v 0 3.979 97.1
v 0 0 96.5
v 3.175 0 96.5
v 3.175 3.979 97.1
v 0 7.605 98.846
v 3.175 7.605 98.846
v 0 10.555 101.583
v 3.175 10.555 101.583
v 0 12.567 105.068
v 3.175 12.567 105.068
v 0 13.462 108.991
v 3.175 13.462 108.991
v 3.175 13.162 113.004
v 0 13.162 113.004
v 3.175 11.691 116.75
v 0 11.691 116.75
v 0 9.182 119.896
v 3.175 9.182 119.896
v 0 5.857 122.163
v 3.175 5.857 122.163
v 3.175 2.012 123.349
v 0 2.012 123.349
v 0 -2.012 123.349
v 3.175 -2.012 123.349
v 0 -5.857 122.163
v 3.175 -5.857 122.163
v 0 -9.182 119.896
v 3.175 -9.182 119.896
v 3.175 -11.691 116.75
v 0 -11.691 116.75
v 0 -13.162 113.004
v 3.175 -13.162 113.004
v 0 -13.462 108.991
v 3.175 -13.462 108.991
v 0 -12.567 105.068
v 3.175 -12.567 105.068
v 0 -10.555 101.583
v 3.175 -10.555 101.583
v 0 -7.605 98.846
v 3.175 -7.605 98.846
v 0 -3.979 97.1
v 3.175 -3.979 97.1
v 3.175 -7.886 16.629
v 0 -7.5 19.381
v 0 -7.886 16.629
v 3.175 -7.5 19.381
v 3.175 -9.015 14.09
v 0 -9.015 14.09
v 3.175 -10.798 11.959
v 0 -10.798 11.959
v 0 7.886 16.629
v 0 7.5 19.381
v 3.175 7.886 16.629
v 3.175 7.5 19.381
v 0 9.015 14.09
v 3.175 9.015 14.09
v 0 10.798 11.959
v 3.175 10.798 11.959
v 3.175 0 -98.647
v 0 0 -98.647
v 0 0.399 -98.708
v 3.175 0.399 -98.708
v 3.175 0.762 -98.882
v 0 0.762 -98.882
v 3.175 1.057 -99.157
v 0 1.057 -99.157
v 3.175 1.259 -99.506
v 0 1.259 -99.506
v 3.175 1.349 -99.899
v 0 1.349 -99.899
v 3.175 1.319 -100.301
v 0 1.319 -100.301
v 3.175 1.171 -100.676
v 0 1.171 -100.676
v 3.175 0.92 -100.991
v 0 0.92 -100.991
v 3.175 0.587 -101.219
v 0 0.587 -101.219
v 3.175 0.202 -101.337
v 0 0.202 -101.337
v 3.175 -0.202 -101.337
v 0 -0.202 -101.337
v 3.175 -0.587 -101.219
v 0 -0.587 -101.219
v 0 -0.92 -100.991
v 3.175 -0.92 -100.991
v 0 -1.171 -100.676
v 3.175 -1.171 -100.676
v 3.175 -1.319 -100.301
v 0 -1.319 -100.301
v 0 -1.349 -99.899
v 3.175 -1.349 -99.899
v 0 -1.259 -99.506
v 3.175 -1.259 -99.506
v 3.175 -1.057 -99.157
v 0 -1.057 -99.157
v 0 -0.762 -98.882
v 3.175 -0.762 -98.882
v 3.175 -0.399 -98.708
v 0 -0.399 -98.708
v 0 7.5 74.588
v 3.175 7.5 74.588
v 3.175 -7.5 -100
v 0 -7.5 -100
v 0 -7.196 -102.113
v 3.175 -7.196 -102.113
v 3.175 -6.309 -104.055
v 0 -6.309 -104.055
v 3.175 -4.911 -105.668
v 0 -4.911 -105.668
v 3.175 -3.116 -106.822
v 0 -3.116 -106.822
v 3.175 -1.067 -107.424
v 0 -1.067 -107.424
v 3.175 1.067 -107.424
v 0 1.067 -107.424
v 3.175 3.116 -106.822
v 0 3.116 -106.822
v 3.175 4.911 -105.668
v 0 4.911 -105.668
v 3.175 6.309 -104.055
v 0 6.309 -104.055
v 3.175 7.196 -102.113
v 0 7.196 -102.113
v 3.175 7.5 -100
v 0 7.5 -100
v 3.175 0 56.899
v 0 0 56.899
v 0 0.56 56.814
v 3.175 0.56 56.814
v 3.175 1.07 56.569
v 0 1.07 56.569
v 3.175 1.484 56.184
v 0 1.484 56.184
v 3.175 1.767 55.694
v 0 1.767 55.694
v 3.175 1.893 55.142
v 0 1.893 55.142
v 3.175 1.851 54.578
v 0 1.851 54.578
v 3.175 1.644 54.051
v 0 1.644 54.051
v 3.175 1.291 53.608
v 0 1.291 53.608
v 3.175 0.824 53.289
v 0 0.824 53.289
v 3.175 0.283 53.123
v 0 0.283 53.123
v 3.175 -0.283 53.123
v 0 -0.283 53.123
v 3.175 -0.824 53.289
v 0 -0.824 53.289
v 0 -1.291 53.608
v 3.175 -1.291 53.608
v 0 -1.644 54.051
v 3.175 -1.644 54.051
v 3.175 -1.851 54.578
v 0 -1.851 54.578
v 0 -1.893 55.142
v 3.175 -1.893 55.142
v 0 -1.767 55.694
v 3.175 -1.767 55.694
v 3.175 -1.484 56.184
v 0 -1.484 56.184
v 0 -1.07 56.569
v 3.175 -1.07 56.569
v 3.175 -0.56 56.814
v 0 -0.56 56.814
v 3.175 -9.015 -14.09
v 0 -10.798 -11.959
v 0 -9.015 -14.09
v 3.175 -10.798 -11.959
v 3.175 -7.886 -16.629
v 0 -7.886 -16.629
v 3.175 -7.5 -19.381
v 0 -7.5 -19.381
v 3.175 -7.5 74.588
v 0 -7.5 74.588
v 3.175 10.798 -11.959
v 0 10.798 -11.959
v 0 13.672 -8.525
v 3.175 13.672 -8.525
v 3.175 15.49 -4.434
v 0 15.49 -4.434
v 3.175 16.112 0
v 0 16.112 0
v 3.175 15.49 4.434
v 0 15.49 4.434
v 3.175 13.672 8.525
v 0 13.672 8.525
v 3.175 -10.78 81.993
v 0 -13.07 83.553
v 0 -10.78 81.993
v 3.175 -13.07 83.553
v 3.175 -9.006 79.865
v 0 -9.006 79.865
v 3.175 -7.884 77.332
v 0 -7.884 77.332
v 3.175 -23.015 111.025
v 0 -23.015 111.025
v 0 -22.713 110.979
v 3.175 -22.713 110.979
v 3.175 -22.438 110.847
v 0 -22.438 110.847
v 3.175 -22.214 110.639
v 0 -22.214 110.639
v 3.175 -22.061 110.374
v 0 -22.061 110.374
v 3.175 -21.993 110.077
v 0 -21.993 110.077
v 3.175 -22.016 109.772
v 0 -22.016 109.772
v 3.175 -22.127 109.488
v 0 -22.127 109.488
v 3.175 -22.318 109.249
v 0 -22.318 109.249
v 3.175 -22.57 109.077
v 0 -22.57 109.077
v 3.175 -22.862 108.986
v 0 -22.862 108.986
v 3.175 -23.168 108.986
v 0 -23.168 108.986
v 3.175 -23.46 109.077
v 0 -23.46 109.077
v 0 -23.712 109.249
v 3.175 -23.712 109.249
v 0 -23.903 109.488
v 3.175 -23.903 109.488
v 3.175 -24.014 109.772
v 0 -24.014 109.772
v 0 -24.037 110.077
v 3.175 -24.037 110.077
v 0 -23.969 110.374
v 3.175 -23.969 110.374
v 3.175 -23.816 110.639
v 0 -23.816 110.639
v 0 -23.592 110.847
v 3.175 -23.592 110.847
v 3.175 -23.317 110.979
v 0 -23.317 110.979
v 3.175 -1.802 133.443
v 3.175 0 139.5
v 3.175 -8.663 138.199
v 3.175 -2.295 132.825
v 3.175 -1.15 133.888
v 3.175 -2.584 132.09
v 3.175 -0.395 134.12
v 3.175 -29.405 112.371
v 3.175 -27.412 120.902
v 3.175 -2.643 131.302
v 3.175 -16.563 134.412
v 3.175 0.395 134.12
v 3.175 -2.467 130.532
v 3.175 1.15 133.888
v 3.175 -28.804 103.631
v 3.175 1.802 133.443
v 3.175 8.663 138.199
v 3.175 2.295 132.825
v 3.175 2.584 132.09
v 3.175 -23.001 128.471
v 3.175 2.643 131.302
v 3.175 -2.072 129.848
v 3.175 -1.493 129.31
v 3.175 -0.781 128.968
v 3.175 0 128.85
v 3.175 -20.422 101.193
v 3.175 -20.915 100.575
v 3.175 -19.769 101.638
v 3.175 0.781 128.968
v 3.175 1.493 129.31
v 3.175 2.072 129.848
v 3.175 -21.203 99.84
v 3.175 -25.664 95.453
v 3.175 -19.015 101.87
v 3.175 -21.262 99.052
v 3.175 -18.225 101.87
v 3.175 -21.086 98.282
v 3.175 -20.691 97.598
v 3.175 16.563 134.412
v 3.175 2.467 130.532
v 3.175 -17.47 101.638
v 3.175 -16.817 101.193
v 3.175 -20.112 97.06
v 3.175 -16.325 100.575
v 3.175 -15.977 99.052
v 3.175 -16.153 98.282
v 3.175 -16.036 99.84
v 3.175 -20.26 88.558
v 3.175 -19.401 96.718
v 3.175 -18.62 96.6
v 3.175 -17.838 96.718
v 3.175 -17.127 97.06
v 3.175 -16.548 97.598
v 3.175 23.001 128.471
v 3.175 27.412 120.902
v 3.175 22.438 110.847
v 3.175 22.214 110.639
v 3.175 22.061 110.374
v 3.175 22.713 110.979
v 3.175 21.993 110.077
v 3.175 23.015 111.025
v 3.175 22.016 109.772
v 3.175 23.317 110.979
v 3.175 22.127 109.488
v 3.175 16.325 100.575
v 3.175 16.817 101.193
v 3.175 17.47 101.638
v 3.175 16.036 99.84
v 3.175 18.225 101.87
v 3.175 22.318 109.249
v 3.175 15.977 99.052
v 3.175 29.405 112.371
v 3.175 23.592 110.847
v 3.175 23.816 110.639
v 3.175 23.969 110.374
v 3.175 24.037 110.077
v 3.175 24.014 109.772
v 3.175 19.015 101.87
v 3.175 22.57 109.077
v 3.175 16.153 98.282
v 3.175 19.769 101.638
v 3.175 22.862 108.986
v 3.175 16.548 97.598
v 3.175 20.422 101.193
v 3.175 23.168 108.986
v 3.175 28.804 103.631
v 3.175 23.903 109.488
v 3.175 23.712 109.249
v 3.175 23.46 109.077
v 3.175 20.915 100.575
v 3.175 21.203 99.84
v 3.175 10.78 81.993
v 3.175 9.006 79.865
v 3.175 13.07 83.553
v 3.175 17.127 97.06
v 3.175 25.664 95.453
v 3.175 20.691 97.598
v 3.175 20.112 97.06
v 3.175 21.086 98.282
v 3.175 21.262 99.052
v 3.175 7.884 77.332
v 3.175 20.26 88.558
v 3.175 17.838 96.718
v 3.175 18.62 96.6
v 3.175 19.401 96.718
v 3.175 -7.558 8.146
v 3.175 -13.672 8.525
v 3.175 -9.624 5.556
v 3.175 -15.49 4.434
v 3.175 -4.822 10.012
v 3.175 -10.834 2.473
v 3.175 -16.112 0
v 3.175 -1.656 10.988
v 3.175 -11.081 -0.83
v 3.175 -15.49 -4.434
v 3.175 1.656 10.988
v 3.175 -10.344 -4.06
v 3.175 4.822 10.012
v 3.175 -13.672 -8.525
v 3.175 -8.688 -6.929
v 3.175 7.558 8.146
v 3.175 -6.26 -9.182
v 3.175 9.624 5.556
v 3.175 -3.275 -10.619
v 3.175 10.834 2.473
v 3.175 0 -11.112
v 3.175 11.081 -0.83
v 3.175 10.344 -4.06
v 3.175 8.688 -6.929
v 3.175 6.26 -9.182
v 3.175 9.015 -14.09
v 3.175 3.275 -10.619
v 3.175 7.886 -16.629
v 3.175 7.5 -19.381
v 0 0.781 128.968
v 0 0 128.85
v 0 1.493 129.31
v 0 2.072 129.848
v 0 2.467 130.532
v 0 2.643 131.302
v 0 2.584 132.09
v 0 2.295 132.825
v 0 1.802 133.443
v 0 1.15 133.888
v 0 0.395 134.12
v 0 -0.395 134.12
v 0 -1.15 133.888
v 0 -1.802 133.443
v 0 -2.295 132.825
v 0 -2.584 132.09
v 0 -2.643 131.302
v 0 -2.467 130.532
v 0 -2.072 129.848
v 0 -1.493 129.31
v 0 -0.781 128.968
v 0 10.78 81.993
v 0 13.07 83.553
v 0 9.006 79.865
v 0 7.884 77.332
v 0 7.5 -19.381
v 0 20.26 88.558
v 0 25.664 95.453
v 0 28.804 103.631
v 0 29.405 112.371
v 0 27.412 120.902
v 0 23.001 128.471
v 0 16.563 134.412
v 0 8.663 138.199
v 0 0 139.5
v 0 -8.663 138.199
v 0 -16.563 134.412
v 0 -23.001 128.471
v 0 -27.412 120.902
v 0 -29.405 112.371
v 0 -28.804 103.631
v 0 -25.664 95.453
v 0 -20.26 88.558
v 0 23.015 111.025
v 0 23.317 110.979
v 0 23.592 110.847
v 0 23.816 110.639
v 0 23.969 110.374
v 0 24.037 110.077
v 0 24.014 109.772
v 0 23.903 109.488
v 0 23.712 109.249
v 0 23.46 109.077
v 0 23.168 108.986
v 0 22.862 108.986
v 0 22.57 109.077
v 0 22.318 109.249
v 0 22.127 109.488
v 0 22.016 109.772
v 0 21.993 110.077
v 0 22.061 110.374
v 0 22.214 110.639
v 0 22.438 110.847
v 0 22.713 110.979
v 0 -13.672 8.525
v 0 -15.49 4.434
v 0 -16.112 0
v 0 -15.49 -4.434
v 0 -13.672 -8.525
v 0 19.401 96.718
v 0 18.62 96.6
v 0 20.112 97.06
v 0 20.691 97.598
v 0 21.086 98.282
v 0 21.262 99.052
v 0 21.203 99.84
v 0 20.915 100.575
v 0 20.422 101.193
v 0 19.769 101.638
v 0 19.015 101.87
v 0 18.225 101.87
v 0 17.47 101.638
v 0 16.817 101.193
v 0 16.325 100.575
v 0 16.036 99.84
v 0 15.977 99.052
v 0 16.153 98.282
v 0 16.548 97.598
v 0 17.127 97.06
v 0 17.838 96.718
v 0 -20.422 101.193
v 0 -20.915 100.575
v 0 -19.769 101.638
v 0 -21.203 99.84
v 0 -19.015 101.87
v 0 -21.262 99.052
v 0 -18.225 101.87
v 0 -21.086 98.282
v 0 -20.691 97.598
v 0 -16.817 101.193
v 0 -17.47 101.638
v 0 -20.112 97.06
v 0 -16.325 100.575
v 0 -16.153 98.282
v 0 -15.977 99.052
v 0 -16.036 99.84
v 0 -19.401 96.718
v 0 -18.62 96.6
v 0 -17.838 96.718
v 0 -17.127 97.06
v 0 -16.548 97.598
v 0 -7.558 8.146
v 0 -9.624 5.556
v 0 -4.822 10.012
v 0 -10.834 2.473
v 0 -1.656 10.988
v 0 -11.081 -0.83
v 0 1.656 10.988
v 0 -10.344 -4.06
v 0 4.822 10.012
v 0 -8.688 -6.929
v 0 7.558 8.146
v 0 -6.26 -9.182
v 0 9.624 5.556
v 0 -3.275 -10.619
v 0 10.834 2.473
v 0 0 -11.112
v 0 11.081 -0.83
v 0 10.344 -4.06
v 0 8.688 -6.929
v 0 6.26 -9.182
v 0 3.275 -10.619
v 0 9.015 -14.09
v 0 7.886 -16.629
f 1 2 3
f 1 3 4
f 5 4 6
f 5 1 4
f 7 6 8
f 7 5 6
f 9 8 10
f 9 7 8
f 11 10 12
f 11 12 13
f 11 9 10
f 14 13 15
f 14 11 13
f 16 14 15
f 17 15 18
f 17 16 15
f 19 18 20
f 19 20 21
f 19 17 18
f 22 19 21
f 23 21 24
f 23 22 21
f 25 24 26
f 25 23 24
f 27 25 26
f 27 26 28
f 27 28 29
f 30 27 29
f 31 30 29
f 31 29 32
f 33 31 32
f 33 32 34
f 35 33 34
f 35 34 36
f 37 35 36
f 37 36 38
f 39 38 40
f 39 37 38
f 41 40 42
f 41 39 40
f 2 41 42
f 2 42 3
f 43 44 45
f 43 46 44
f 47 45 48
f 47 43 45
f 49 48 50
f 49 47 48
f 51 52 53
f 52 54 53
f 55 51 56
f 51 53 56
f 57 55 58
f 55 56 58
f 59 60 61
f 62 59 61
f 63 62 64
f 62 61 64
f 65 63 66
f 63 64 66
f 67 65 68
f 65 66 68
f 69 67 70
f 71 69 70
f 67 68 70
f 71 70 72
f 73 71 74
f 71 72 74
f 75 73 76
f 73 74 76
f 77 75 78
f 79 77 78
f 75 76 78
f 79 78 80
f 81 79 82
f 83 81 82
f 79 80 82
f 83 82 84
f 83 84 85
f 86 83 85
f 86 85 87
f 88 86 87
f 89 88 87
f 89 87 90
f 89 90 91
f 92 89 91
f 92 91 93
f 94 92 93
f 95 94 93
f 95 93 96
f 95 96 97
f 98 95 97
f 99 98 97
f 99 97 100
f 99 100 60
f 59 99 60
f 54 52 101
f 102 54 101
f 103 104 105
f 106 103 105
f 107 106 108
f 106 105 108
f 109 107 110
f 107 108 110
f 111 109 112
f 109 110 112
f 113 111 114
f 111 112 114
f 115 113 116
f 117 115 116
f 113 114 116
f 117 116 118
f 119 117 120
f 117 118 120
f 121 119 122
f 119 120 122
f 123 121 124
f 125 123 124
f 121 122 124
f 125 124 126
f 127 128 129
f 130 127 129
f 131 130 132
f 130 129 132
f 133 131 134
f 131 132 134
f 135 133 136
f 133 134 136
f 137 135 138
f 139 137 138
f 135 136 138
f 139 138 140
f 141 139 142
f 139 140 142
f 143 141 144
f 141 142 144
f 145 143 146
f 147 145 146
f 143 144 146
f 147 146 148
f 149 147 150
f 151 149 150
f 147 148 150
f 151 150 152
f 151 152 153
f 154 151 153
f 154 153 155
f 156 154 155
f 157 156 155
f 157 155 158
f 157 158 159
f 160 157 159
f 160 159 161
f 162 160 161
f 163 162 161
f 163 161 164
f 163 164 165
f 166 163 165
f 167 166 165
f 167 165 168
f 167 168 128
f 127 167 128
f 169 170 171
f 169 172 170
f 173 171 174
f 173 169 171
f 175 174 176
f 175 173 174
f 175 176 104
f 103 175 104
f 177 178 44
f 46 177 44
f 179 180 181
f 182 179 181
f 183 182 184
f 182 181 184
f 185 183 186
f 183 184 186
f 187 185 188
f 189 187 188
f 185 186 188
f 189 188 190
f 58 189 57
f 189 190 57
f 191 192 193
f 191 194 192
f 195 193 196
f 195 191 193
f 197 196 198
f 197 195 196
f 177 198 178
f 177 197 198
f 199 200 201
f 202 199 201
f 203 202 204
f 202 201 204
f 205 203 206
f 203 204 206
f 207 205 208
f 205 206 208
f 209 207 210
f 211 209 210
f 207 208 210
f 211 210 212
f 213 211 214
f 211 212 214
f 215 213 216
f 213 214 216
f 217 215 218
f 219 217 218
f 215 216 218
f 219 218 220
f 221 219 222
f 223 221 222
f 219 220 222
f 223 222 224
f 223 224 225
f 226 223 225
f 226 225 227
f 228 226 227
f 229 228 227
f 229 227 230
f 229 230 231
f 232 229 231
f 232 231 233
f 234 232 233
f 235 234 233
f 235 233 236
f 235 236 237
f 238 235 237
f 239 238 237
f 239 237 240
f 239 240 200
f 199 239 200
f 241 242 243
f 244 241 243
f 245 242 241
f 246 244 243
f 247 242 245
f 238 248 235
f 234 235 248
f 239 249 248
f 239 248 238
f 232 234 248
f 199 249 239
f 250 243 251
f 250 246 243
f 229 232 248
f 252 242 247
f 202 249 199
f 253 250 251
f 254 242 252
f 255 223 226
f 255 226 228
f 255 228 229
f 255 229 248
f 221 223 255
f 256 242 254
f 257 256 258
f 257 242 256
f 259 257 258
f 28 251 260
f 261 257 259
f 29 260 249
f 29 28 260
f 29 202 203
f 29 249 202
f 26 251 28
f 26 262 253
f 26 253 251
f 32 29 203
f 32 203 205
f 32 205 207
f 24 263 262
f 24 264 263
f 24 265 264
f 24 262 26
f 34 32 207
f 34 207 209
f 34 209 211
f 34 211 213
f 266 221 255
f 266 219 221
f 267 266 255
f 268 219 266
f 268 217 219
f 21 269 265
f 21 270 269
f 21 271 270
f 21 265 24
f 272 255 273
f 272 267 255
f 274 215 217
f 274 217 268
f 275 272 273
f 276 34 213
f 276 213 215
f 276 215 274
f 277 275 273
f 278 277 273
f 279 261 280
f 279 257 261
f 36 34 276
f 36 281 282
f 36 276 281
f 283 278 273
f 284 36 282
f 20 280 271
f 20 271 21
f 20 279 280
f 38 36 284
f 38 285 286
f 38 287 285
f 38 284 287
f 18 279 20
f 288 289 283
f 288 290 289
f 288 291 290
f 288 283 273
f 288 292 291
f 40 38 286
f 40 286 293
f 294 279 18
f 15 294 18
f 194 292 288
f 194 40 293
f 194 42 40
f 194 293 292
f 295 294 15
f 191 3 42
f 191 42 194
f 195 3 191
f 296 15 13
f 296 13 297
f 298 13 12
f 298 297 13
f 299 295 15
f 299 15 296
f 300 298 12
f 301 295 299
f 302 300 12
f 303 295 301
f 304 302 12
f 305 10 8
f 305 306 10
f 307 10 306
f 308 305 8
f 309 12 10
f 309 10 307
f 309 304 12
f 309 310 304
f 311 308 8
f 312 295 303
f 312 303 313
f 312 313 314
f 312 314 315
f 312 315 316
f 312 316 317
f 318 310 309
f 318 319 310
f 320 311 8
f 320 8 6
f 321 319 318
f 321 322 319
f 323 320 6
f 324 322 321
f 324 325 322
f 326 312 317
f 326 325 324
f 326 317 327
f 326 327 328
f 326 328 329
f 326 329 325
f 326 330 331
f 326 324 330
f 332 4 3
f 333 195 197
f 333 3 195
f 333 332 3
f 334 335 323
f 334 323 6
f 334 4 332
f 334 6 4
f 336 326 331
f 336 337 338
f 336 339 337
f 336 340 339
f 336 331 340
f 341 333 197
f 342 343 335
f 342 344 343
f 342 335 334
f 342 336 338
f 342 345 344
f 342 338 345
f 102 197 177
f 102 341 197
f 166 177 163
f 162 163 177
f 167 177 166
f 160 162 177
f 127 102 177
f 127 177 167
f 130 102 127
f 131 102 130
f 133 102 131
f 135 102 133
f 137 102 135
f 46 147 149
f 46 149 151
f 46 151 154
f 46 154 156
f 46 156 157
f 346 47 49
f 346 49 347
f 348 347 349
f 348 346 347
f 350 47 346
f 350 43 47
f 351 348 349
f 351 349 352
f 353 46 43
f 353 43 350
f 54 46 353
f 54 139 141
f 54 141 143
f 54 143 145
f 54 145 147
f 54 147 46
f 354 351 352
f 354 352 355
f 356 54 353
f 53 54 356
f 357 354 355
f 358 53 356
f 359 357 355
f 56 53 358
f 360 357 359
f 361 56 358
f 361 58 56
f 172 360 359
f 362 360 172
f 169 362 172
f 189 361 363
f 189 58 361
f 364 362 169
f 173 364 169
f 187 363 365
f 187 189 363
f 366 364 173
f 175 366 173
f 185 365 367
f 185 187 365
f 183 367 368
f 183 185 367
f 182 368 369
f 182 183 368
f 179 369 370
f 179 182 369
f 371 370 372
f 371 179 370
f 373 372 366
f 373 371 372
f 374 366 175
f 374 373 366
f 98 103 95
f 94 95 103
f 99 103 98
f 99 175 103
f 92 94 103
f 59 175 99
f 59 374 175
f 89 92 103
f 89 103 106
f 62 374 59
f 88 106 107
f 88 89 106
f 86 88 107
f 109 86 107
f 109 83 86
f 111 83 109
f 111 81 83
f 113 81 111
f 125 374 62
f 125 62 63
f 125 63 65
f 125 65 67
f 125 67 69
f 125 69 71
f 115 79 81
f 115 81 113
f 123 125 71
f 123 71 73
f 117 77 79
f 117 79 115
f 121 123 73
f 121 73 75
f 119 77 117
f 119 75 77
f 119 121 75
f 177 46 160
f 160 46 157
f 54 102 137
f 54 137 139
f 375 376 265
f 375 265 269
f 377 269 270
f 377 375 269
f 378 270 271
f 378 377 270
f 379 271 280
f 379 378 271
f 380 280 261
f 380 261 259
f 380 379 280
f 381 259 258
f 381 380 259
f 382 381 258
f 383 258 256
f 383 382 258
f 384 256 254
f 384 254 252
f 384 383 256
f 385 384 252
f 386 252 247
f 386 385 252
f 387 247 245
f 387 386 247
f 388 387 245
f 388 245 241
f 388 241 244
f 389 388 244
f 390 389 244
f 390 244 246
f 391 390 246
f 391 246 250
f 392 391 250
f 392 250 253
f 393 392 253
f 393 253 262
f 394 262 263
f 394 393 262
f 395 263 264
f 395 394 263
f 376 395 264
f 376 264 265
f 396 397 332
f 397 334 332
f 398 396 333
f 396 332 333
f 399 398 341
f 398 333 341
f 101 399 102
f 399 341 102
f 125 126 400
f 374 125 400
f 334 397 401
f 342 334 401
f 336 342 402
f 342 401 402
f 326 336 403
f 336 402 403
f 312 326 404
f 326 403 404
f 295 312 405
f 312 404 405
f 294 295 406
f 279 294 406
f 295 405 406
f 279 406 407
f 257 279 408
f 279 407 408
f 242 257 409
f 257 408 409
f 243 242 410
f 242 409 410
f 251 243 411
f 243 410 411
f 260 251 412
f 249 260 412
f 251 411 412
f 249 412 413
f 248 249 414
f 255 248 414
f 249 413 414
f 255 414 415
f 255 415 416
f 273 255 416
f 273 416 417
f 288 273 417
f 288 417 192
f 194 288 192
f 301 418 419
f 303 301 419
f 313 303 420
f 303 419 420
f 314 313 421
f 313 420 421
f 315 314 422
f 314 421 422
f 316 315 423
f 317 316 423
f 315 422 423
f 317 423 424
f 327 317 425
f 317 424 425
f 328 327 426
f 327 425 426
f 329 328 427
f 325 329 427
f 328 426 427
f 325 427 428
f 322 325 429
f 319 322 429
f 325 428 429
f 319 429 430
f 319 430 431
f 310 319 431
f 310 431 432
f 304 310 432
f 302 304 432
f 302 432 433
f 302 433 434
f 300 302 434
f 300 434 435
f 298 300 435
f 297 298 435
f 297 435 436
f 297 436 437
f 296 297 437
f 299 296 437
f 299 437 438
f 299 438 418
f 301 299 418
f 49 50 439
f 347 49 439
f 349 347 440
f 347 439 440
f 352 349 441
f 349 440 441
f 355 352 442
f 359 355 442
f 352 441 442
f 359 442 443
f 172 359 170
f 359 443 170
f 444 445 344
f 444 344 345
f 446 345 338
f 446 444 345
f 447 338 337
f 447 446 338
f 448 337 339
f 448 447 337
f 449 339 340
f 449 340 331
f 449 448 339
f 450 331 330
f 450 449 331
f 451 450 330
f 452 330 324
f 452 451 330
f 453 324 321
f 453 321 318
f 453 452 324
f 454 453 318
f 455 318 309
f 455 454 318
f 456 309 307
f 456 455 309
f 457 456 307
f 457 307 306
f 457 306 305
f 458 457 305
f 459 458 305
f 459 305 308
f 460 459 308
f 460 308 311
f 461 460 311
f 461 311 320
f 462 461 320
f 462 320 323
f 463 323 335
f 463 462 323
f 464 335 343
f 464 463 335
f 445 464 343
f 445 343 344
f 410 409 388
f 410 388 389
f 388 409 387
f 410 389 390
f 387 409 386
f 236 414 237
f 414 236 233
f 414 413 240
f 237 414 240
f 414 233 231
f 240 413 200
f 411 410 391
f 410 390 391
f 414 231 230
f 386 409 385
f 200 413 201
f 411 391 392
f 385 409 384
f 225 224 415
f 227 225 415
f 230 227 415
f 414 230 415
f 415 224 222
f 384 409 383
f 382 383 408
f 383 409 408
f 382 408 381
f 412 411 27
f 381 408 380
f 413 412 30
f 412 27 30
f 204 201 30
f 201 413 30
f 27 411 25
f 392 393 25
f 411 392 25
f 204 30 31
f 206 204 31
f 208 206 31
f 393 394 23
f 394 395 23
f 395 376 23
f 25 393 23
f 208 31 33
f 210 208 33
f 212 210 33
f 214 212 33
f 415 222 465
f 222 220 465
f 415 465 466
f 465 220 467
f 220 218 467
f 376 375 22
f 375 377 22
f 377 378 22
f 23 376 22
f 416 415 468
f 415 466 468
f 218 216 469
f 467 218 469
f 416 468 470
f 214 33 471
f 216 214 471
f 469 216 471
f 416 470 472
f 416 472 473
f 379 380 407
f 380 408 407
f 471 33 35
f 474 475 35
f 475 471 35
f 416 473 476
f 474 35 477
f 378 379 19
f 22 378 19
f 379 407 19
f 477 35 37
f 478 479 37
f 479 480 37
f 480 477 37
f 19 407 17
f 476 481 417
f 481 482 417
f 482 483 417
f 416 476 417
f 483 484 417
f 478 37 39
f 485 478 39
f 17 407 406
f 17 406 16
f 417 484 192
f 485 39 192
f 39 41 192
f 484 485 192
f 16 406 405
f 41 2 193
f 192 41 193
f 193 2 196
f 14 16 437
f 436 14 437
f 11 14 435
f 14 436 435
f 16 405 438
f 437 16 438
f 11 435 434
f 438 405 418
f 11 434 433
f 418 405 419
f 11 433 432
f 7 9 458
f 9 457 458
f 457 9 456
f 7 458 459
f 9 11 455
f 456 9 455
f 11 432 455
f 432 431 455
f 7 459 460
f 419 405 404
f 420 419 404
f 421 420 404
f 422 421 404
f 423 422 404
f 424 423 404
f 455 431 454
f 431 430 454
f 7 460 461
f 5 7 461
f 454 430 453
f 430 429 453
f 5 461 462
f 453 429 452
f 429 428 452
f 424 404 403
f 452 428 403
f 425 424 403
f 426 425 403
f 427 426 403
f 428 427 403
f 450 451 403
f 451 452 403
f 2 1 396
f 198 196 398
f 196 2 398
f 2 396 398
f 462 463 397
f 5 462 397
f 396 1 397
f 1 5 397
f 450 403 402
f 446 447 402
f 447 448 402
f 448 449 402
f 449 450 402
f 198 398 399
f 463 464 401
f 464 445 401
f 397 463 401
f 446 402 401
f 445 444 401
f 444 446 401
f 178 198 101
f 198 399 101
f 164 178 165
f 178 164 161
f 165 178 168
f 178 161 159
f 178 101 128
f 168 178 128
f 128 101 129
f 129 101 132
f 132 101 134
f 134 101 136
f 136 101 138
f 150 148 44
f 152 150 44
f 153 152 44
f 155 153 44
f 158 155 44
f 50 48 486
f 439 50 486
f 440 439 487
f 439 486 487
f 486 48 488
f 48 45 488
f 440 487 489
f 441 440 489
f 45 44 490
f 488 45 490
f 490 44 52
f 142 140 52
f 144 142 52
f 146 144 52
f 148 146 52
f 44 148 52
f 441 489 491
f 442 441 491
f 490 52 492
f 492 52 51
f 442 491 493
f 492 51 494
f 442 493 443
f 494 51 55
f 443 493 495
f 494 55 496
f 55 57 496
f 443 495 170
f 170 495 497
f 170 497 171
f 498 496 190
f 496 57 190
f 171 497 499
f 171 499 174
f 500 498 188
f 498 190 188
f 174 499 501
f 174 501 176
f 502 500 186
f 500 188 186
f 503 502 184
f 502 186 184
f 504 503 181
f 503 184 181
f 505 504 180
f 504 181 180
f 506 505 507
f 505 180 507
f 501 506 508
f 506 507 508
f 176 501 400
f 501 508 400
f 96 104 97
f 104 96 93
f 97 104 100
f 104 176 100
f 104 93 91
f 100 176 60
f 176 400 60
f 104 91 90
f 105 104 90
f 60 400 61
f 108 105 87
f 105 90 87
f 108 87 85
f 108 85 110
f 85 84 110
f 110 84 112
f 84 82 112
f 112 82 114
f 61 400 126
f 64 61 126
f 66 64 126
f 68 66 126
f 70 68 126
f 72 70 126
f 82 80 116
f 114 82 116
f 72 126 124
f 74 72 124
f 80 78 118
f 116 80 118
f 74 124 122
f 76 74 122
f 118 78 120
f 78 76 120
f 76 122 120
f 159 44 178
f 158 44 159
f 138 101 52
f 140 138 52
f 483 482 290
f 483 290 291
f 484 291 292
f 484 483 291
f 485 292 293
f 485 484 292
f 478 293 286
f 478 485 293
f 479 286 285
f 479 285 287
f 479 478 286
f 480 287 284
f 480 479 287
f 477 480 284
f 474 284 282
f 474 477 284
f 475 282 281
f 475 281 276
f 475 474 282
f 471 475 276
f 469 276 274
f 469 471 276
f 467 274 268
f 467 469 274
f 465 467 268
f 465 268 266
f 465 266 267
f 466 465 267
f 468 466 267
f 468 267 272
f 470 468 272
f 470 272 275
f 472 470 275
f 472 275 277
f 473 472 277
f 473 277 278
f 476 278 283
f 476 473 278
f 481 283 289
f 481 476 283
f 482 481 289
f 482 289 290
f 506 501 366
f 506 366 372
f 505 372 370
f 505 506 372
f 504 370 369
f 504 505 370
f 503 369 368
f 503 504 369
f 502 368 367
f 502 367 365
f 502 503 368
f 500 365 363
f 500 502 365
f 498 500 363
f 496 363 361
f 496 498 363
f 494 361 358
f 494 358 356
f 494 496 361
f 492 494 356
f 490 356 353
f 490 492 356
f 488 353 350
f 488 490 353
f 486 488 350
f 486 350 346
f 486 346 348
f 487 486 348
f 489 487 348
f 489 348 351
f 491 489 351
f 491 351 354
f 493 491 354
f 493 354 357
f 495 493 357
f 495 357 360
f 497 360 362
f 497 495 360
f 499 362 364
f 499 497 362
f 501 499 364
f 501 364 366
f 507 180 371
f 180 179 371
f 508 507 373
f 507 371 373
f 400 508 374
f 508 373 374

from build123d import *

# Parameters (mm, degrees)
SKETCH1_R                = 13.5
SKETCH1_R_2              = 2.65
SKETCH1_R_3              = 11.1125
BOSS_EXTRUDE1_DEPTH      = 3.175
M2_5X0_45_TAPPED_HOLE1_D = 2.05
F_6_CLEARANCE_HOLE1_D    = 3.7973
F_6_32_TAPPED_HOLE1_D    = 2.7051
FILLET1_R                = 10


with BuildPart() as part:
    # Sketch1 → Boss-Extrude1 (new body)
    with BuildSketch(Plane(origin=(0, 0, 0), x_dir=(0, 0, -1), z_dir=(1, 0, 0))):
        with BuildLine():
            ThreePointArc((-81.469314765, 7.5), (-139.5, 0), (-81.469314765, -7.5))
            Line((-81.469314765, -7.5), (-14.260527909, -7.5))
            ThreePointArc((-14.260527909, -7.5), (0, -16.1125), (14.260527909, -7.5))
            Line((14.260527909, -7.5), (100, -7.5))
            ThreePointArc((100, -7.5), (107.5, 0), (100, 7.5))
            Line((100, 7.5), (14.260527909, 7.5))
            ThreePointArc((14.260527909, 7.5), (0, 16.1125), (-14.260527909, 7.5))
            Line((-14.260527909, 7.5), (-81.469314765, 7.5))
        make_face()
        with Locations((-110, 0)):
            Circle(SKETCH1_R, mode=Mode.SUBTRACT)
        with Locations((-99.25, -18.619546181)):
            Circle(SKETCH1_R_2, mode=Mode.SUBTRACT)
        with Locations((-131.5, 0)):
            Circle(SKETCH1_R_2, mode=Mode.SUBTRACT)
        with Locations((-99.25, 18.619546181)):
            Circle(SKETCH1_R_2, mode=Mode.SUBTRACT)
        Circle(SKETCH1_R_3, mode=Mode.SUBTRACT)
    extrude(amount=BOSS_EXTRUDE1_DEPTH)

    # M2.5x0.45 Tapped Hole1 (through all)
    with Locations(Plane(origin=(3.175, 0, 0), x_dir=(0, 0, -1), z_dir=(1, 0, 0))):
        with Locations((-110, -23.015), (-110, 23.015)):
            Hole(M2_5X0_45_TAPPED_HOLE1_D / 2)

    # #6 Clearance Hole1 (through all)
    with Locations(Plane(origin=(3.175, 0, 0), x_dir=(0, 0, -1), z_dir=(1, 0, 0))):
        with Locations((-55, 0)):
            Hole(F_6_CLEARANCE_HOLE1_D / 2)

    # #6-32 Tapped Hole1 (through all)
    with Locations(Plane(origin=(3.175, 0, 0), x_dir=(0, 0, -1), z_dir=(1, 0, 0))):
        with Locations((100, 0)):
            Hole(F_6_32_TAPPED_HOLE1_D / 2)

    # Fillet1
    fillet1_edges = [part.edges().sort_by_distance(p)[0] for p in [
        (1.5875, 7.5, 81.469314765),
        (1.5875, 7.5, 14.260527909),
        (1.5875, 7.5, -14.260527909),
        (1.5875, -7.5, -14.260527909),
        (1.5875, -7.5, 14.260527909),
        (1.5875, -7.5, 81.469314765),
    ]]
    fillet(fillet1_edges, radius=FILLET1_R)


solid = part.part
